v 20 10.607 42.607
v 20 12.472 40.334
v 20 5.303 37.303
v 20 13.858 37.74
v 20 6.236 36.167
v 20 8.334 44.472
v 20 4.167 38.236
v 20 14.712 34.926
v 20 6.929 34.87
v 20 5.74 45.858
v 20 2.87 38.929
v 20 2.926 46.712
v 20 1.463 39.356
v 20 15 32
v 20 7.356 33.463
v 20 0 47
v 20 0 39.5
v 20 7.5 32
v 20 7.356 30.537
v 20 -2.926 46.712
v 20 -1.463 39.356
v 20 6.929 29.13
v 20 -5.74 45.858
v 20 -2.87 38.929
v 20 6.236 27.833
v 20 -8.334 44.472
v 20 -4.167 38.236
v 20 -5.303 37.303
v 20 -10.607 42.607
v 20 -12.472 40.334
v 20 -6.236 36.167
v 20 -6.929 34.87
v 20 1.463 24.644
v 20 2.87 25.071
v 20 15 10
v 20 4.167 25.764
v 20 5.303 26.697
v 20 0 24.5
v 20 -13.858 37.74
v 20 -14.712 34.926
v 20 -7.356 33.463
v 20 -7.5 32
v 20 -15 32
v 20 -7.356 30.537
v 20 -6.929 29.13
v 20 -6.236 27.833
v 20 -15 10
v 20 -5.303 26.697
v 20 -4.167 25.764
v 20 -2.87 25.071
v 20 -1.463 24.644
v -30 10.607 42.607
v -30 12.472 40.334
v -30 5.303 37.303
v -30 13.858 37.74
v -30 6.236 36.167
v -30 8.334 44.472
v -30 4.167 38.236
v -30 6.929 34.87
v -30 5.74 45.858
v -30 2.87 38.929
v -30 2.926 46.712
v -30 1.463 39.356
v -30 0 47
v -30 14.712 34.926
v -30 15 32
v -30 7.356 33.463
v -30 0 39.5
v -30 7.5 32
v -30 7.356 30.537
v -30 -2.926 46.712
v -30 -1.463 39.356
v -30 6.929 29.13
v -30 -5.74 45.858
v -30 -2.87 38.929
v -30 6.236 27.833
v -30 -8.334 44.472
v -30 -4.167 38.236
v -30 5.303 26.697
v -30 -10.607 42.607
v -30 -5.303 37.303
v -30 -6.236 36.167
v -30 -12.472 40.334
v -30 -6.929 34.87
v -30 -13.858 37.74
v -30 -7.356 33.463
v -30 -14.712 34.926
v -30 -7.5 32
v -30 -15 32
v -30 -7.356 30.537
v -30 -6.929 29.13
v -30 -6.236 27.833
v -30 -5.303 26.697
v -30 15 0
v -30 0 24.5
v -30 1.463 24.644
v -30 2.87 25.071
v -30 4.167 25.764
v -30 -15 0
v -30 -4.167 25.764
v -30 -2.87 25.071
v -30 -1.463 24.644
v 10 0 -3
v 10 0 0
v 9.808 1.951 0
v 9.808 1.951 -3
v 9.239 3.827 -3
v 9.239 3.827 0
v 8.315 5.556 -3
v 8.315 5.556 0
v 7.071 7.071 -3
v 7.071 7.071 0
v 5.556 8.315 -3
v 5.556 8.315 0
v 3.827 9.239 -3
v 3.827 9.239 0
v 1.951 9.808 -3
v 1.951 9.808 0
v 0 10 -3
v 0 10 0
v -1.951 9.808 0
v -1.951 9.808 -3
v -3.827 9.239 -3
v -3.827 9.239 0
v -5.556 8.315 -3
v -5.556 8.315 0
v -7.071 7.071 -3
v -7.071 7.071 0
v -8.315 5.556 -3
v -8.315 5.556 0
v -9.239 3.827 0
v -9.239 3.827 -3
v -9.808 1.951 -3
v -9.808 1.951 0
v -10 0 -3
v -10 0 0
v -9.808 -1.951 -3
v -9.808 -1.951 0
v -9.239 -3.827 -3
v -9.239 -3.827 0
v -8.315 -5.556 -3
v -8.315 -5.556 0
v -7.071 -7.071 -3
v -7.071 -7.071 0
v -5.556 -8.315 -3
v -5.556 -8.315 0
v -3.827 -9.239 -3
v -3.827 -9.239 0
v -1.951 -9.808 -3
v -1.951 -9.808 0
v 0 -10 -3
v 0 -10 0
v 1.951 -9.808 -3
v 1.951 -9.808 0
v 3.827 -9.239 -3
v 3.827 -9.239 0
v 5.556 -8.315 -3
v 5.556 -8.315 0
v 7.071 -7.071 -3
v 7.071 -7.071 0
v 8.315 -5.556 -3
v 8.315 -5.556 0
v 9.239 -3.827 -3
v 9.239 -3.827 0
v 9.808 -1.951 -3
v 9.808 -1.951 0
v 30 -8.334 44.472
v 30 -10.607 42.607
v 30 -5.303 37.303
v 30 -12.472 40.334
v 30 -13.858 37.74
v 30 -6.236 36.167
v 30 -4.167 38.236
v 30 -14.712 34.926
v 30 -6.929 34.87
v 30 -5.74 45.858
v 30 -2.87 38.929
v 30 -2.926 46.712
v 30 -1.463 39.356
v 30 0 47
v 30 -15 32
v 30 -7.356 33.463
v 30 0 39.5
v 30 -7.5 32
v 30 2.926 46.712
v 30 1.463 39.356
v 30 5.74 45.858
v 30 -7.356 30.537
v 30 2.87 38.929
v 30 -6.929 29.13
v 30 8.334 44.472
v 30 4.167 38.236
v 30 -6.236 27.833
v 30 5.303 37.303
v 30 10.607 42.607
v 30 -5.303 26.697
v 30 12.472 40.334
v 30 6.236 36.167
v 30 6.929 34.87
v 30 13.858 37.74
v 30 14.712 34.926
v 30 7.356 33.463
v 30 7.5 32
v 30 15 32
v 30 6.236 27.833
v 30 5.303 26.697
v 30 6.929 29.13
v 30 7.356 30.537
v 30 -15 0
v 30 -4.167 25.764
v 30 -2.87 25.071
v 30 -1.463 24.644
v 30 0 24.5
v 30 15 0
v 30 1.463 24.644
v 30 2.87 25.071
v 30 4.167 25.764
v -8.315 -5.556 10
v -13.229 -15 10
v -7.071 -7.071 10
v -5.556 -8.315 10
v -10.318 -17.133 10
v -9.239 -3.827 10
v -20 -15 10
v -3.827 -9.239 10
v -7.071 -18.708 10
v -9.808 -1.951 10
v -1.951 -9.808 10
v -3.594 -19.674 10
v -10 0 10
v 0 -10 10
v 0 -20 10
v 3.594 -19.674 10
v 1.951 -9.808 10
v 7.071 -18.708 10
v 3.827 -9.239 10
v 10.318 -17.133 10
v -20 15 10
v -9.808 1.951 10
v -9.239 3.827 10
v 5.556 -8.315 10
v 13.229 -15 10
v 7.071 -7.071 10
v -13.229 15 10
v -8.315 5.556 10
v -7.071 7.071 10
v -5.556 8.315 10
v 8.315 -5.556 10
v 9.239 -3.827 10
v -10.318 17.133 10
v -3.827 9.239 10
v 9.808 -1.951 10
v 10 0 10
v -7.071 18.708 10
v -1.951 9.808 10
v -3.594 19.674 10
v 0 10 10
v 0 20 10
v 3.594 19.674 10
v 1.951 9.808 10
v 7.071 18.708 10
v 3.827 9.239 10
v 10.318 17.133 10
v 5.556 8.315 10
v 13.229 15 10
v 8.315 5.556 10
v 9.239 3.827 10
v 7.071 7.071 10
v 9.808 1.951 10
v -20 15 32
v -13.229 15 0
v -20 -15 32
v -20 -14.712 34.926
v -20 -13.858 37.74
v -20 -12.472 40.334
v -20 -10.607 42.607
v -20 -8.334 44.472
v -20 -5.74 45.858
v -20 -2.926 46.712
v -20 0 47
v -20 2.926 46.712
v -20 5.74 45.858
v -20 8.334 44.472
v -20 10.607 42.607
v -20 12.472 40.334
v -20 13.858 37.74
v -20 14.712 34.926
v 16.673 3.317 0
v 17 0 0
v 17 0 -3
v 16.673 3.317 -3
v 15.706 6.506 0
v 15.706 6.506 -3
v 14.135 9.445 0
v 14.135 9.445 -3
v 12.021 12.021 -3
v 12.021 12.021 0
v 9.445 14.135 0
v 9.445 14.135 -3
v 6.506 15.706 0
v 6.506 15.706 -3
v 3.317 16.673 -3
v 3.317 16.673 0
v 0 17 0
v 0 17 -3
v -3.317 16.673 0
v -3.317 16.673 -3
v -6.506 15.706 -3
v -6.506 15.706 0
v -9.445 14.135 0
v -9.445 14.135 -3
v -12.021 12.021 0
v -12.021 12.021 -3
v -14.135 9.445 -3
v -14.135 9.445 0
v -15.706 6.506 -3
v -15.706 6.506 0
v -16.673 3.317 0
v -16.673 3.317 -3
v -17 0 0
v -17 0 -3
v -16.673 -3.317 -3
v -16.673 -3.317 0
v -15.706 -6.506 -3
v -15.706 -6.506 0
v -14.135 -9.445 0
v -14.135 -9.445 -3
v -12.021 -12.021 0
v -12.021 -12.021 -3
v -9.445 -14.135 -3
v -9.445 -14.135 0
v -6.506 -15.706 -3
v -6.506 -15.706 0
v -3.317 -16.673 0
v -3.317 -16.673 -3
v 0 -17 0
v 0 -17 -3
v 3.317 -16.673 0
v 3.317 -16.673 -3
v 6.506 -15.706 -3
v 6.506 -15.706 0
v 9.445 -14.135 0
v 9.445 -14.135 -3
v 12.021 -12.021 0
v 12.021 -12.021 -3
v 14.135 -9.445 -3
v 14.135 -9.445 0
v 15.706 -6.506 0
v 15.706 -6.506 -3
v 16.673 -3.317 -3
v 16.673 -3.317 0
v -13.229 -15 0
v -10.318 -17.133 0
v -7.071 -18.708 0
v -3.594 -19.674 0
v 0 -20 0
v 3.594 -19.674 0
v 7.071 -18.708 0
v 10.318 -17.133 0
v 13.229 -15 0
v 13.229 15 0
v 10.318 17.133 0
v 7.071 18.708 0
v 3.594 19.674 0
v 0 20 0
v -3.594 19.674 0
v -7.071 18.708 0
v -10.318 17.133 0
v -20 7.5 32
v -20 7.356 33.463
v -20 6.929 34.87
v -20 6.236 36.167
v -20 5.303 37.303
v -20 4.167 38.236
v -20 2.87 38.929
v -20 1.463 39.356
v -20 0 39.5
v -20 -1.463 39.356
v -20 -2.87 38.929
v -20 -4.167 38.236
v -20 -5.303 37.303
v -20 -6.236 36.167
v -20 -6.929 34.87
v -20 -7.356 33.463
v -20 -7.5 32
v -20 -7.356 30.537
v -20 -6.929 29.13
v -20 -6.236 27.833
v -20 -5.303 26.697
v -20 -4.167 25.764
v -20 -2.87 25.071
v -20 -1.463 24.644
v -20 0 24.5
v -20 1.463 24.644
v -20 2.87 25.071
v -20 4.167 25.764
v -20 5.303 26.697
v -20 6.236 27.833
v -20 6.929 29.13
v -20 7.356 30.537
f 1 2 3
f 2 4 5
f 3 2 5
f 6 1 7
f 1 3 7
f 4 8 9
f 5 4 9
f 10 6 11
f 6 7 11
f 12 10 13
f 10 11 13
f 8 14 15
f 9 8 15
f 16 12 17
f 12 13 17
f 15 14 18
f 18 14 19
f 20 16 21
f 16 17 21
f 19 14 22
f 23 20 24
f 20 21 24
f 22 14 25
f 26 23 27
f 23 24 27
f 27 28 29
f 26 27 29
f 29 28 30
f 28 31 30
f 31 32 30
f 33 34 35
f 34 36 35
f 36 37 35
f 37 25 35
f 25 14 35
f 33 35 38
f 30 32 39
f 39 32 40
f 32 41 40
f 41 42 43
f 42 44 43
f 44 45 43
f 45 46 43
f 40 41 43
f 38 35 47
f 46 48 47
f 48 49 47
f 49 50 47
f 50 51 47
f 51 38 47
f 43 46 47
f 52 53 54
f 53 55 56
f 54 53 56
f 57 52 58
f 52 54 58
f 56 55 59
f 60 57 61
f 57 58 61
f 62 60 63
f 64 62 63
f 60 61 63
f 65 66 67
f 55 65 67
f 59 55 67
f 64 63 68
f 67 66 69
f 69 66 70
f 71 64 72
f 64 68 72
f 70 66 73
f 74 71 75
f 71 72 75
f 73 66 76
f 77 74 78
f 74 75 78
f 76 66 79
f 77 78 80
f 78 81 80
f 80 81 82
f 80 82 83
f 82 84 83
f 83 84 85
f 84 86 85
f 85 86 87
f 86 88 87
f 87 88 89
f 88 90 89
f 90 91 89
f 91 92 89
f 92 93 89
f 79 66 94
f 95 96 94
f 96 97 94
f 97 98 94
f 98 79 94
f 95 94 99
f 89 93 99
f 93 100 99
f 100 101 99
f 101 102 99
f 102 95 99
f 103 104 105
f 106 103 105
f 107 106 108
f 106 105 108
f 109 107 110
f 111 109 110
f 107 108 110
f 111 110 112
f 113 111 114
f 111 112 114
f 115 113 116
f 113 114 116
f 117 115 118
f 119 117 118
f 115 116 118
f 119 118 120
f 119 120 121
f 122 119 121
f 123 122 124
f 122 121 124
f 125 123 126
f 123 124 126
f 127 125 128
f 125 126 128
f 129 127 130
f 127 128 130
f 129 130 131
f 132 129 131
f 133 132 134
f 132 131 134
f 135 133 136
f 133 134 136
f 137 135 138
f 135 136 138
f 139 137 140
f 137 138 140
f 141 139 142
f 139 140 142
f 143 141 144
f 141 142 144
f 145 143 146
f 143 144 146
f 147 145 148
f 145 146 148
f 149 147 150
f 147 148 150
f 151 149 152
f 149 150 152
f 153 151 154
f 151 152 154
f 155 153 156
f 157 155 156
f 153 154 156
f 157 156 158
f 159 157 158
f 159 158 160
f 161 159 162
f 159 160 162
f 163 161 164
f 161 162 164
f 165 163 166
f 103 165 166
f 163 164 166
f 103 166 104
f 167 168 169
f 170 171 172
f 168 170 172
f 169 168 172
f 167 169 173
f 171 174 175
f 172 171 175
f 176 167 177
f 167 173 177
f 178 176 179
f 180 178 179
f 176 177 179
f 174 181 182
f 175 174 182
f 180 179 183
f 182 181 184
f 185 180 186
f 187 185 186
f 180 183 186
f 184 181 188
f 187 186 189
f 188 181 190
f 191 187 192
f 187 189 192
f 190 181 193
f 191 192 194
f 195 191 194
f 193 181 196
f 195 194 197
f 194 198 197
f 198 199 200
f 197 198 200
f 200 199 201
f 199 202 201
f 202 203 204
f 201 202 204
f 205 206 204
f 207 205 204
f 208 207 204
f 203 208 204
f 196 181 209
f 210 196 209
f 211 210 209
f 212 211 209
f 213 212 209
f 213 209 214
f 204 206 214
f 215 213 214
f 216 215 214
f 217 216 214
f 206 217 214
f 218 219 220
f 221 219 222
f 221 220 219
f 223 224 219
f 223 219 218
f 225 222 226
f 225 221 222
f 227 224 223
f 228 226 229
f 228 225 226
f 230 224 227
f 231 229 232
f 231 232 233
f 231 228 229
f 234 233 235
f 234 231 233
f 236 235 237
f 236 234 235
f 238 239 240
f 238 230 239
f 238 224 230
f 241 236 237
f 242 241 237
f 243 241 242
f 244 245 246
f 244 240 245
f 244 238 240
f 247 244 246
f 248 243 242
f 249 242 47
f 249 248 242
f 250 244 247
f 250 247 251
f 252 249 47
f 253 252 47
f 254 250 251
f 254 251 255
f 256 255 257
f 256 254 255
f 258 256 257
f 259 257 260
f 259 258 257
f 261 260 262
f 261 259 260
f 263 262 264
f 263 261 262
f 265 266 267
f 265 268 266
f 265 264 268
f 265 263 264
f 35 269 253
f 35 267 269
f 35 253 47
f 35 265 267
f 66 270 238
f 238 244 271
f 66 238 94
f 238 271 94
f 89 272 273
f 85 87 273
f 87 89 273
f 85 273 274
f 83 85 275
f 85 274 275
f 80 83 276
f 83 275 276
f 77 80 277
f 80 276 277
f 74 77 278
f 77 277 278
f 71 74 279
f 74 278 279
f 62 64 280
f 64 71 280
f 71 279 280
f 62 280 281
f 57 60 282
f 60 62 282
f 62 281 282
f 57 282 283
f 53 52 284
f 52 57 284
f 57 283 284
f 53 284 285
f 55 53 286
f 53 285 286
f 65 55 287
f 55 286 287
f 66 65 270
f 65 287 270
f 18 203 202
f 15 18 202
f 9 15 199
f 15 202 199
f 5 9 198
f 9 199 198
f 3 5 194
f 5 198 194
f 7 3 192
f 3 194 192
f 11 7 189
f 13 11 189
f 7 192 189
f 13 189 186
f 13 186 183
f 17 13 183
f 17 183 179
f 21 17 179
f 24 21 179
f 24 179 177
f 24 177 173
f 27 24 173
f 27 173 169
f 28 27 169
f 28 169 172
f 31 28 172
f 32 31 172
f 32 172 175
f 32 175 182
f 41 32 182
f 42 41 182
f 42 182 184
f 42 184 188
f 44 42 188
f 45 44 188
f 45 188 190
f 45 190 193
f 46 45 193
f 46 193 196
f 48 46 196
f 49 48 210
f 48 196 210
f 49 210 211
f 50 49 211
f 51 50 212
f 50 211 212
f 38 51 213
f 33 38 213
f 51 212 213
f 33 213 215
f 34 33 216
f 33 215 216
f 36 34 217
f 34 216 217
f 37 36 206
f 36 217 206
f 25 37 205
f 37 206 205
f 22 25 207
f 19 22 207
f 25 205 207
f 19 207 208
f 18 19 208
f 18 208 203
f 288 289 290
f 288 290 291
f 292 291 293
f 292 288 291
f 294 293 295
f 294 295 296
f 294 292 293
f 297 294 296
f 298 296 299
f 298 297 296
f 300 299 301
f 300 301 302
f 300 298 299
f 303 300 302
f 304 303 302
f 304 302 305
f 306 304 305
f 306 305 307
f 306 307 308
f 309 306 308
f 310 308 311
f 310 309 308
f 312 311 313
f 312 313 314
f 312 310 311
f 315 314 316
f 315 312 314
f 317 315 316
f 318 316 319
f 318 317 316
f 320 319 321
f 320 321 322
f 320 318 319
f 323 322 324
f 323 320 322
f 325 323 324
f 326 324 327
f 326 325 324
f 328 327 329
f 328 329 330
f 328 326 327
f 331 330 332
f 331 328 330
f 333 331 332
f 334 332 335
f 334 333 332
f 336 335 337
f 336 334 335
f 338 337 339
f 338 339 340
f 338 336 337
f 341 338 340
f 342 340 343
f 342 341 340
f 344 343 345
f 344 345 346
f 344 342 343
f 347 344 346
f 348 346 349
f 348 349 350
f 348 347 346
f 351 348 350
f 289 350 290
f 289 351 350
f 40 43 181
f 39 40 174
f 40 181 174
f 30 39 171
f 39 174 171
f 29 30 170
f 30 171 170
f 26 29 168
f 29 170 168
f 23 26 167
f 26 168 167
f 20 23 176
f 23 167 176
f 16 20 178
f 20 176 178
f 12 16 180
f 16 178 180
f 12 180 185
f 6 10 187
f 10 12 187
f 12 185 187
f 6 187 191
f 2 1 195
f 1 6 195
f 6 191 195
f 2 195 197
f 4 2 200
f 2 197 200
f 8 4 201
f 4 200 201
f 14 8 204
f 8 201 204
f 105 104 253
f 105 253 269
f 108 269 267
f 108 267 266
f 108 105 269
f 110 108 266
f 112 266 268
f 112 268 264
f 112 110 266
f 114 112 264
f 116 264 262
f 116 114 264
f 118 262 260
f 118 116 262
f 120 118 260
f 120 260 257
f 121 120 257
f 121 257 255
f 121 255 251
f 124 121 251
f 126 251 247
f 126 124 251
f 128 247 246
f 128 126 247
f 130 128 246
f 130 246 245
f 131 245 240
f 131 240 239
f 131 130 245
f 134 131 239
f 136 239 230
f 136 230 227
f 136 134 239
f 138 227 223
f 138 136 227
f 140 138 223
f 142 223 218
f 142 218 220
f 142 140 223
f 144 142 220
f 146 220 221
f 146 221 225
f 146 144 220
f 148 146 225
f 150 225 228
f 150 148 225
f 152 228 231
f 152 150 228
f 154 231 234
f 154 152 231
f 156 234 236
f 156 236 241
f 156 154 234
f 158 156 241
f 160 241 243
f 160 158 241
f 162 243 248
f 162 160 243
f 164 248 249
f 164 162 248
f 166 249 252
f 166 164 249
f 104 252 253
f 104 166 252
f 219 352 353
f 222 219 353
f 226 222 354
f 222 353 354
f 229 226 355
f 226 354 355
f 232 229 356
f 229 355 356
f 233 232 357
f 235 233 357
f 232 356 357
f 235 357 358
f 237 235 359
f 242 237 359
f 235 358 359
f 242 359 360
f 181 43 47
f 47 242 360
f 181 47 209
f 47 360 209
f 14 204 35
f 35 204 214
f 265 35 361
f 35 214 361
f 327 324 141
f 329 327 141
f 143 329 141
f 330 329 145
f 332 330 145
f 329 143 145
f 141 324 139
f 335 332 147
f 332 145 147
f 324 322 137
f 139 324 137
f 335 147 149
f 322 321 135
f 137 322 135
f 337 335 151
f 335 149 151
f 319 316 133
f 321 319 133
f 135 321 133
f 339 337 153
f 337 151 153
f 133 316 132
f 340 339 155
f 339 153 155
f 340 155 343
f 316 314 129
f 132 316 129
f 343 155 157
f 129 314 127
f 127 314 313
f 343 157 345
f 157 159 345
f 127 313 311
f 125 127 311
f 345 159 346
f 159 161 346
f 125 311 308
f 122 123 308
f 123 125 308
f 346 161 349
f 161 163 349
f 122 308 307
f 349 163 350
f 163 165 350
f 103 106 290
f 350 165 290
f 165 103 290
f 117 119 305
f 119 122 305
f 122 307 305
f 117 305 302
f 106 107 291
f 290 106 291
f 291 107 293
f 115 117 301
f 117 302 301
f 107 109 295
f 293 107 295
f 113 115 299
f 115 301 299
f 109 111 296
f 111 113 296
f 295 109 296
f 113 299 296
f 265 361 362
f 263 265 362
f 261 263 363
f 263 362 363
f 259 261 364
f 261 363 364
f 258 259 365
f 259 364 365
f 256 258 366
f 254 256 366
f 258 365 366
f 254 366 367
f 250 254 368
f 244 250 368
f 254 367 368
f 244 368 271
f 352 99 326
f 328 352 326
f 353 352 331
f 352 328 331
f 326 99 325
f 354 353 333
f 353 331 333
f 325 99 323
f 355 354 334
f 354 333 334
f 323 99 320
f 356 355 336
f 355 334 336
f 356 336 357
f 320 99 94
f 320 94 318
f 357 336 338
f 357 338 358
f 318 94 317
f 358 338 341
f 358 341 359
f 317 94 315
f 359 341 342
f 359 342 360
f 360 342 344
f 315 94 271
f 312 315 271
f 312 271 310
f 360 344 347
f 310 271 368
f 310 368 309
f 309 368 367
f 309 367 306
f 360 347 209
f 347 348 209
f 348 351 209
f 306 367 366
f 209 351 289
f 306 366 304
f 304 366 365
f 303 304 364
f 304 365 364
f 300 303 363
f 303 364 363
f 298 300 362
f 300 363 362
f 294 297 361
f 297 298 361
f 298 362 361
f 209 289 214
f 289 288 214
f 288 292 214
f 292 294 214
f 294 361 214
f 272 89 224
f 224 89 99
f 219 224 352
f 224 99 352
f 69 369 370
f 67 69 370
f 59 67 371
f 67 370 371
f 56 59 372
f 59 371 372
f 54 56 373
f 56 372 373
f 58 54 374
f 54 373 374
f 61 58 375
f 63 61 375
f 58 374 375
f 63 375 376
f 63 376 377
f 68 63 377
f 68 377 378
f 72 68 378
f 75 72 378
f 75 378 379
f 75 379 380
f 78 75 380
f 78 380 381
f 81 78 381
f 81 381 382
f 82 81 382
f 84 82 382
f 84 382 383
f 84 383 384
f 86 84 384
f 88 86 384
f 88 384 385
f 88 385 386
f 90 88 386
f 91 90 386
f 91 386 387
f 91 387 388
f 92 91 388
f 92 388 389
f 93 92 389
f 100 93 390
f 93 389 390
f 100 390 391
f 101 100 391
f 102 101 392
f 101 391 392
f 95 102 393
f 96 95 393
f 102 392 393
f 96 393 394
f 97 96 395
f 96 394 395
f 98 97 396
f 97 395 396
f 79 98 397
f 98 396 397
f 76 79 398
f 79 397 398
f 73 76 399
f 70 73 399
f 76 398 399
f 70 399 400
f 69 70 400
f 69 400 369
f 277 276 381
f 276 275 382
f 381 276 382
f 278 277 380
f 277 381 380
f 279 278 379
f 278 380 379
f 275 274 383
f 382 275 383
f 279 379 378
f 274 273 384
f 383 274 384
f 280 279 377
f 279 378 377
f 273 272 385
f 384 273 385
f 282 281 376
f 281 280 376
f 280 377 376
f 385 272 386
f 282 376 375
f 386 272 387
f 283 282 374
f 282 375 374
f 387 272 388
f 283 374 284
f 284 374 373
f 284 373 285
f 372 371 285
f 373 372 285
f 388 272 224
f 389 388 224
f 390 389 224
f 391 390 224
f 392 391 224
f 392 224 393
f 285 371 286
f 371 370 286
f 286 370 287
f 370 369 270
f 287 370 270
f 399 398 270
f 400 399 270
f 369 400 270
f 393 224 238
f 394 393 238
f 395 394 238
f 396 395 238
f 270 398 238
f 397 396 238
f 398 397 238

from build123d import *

# Parameters (mm, degrees)
F0_R     = 10
F1_DEPTH = 10
F2_DEPTH = 47.5
F3_R     = 7.5
F4_DEPTH = 60.001
F5_R     = 17
F5_R_2   = 10
F6_DEPTH = 3


with BuildPart() as f1:
    # F0 (on Top) → F1 (new body)
    with BuildSketch(Plane.XY):
        with BuildLine():
            ThreePointArc((13.2287565553, -15), (18.2287565553, -8.2287565553), (20, 0))
            ThreePointArc((20, 0), (18.2287565553, 8.2287565553), (13.2287565553, 15))
            ThreePointArc((13.2287565553, 15), (0, 20), (-13.2287565553, 15))
            ThreePointArc((-13.2287565553, 15), (-18.2287565565, 8.2287565528), (-20, -5.5e-09))
            ThreePointArc((-20, -5.5e-09), (-18.2287565542, -8.2287565578), (-13.2287565553, -15))
            ThreePointArc((-13.2287565553, -15), (0, -20), (13.2287565553, -15))
        make_face()
        Circle(F0_R, mode=Mode.SUBTRACT)
        with BuildLine():
            ThreePointArc((13.2287565553, 15), (18.2287565553, 8.2287565553), (20, 0))
            Line((20, 0), (20, 15))
            Line((20, 15), (13.2287565553, 15))
        make_face()
        with BuildLine():
            Line((20, -15), (20, 0))
            ThreePointArc((20, 0), (18.2287565553, -8.2287565553), (13.2287565553, -15))
            Line((13.2287565553, -15), (20, -15))
        make_face()
        with BuildLine():
            Line((-20, -15), (-13.2287565553, -15))
            ThreePointArc((-13.2287565553, -15), (-18.2287565542, -8.2287565578), (-20, -5.5e-09))
            Line((-20, -5.5e-09), (-20, -15))
        make_face()
        with BuildLine():
            ThreePointArc((-20, -5.5e-09), (-18.2287565565, 8.2287565528), (-13.2287565553, 15))
            Line((-13.2287565553, 15), (-20, 15))
            Line((-20, 15), (-20, -5.5e-09))
        make_face()
    extrude(amount=F1_DEPTH)

    # F0 (on Top) → F2 (join)
    with BuildSketch(Plane.XY):
        Polygon((20, 15), (20, 0), (20, -15), (30, -15), (30, 15), align=None)
        Polygon((-20, -15), (-20, -5.5e-09), (-20, 15), (-30, 15), (-30, -15), align=None)
    extrude(amount=F2_DEPTH)

    # F3 (on face) → F4 (cut, through all)
    with BuildSketch(Plane.YZ.offset(30)):
        with BuildLine():
            Line((15, 47.5), (-15, 47.5))
            Line((-15, 47.5), (-15, 32))
            ThreePointArc((-15, 32), (0, 47), (15, 32))
            Line((15, 32), (15, 47.5))
        make_face()
        with Locations((0, 32)):
            Circle(F3_R)
    extrude(amount=-F4_DEPTH, mode=Mode.SUBTRACT)

    # F5 (on face) → F6 (join)
    with BuildSketch(Plane.XY):
        Circle(F5_R)
        Circle(F5_R_2, mode=Mode.SUBTRACT)
    extrude(amount=-F6_DEPTH)


solid = f1.part
